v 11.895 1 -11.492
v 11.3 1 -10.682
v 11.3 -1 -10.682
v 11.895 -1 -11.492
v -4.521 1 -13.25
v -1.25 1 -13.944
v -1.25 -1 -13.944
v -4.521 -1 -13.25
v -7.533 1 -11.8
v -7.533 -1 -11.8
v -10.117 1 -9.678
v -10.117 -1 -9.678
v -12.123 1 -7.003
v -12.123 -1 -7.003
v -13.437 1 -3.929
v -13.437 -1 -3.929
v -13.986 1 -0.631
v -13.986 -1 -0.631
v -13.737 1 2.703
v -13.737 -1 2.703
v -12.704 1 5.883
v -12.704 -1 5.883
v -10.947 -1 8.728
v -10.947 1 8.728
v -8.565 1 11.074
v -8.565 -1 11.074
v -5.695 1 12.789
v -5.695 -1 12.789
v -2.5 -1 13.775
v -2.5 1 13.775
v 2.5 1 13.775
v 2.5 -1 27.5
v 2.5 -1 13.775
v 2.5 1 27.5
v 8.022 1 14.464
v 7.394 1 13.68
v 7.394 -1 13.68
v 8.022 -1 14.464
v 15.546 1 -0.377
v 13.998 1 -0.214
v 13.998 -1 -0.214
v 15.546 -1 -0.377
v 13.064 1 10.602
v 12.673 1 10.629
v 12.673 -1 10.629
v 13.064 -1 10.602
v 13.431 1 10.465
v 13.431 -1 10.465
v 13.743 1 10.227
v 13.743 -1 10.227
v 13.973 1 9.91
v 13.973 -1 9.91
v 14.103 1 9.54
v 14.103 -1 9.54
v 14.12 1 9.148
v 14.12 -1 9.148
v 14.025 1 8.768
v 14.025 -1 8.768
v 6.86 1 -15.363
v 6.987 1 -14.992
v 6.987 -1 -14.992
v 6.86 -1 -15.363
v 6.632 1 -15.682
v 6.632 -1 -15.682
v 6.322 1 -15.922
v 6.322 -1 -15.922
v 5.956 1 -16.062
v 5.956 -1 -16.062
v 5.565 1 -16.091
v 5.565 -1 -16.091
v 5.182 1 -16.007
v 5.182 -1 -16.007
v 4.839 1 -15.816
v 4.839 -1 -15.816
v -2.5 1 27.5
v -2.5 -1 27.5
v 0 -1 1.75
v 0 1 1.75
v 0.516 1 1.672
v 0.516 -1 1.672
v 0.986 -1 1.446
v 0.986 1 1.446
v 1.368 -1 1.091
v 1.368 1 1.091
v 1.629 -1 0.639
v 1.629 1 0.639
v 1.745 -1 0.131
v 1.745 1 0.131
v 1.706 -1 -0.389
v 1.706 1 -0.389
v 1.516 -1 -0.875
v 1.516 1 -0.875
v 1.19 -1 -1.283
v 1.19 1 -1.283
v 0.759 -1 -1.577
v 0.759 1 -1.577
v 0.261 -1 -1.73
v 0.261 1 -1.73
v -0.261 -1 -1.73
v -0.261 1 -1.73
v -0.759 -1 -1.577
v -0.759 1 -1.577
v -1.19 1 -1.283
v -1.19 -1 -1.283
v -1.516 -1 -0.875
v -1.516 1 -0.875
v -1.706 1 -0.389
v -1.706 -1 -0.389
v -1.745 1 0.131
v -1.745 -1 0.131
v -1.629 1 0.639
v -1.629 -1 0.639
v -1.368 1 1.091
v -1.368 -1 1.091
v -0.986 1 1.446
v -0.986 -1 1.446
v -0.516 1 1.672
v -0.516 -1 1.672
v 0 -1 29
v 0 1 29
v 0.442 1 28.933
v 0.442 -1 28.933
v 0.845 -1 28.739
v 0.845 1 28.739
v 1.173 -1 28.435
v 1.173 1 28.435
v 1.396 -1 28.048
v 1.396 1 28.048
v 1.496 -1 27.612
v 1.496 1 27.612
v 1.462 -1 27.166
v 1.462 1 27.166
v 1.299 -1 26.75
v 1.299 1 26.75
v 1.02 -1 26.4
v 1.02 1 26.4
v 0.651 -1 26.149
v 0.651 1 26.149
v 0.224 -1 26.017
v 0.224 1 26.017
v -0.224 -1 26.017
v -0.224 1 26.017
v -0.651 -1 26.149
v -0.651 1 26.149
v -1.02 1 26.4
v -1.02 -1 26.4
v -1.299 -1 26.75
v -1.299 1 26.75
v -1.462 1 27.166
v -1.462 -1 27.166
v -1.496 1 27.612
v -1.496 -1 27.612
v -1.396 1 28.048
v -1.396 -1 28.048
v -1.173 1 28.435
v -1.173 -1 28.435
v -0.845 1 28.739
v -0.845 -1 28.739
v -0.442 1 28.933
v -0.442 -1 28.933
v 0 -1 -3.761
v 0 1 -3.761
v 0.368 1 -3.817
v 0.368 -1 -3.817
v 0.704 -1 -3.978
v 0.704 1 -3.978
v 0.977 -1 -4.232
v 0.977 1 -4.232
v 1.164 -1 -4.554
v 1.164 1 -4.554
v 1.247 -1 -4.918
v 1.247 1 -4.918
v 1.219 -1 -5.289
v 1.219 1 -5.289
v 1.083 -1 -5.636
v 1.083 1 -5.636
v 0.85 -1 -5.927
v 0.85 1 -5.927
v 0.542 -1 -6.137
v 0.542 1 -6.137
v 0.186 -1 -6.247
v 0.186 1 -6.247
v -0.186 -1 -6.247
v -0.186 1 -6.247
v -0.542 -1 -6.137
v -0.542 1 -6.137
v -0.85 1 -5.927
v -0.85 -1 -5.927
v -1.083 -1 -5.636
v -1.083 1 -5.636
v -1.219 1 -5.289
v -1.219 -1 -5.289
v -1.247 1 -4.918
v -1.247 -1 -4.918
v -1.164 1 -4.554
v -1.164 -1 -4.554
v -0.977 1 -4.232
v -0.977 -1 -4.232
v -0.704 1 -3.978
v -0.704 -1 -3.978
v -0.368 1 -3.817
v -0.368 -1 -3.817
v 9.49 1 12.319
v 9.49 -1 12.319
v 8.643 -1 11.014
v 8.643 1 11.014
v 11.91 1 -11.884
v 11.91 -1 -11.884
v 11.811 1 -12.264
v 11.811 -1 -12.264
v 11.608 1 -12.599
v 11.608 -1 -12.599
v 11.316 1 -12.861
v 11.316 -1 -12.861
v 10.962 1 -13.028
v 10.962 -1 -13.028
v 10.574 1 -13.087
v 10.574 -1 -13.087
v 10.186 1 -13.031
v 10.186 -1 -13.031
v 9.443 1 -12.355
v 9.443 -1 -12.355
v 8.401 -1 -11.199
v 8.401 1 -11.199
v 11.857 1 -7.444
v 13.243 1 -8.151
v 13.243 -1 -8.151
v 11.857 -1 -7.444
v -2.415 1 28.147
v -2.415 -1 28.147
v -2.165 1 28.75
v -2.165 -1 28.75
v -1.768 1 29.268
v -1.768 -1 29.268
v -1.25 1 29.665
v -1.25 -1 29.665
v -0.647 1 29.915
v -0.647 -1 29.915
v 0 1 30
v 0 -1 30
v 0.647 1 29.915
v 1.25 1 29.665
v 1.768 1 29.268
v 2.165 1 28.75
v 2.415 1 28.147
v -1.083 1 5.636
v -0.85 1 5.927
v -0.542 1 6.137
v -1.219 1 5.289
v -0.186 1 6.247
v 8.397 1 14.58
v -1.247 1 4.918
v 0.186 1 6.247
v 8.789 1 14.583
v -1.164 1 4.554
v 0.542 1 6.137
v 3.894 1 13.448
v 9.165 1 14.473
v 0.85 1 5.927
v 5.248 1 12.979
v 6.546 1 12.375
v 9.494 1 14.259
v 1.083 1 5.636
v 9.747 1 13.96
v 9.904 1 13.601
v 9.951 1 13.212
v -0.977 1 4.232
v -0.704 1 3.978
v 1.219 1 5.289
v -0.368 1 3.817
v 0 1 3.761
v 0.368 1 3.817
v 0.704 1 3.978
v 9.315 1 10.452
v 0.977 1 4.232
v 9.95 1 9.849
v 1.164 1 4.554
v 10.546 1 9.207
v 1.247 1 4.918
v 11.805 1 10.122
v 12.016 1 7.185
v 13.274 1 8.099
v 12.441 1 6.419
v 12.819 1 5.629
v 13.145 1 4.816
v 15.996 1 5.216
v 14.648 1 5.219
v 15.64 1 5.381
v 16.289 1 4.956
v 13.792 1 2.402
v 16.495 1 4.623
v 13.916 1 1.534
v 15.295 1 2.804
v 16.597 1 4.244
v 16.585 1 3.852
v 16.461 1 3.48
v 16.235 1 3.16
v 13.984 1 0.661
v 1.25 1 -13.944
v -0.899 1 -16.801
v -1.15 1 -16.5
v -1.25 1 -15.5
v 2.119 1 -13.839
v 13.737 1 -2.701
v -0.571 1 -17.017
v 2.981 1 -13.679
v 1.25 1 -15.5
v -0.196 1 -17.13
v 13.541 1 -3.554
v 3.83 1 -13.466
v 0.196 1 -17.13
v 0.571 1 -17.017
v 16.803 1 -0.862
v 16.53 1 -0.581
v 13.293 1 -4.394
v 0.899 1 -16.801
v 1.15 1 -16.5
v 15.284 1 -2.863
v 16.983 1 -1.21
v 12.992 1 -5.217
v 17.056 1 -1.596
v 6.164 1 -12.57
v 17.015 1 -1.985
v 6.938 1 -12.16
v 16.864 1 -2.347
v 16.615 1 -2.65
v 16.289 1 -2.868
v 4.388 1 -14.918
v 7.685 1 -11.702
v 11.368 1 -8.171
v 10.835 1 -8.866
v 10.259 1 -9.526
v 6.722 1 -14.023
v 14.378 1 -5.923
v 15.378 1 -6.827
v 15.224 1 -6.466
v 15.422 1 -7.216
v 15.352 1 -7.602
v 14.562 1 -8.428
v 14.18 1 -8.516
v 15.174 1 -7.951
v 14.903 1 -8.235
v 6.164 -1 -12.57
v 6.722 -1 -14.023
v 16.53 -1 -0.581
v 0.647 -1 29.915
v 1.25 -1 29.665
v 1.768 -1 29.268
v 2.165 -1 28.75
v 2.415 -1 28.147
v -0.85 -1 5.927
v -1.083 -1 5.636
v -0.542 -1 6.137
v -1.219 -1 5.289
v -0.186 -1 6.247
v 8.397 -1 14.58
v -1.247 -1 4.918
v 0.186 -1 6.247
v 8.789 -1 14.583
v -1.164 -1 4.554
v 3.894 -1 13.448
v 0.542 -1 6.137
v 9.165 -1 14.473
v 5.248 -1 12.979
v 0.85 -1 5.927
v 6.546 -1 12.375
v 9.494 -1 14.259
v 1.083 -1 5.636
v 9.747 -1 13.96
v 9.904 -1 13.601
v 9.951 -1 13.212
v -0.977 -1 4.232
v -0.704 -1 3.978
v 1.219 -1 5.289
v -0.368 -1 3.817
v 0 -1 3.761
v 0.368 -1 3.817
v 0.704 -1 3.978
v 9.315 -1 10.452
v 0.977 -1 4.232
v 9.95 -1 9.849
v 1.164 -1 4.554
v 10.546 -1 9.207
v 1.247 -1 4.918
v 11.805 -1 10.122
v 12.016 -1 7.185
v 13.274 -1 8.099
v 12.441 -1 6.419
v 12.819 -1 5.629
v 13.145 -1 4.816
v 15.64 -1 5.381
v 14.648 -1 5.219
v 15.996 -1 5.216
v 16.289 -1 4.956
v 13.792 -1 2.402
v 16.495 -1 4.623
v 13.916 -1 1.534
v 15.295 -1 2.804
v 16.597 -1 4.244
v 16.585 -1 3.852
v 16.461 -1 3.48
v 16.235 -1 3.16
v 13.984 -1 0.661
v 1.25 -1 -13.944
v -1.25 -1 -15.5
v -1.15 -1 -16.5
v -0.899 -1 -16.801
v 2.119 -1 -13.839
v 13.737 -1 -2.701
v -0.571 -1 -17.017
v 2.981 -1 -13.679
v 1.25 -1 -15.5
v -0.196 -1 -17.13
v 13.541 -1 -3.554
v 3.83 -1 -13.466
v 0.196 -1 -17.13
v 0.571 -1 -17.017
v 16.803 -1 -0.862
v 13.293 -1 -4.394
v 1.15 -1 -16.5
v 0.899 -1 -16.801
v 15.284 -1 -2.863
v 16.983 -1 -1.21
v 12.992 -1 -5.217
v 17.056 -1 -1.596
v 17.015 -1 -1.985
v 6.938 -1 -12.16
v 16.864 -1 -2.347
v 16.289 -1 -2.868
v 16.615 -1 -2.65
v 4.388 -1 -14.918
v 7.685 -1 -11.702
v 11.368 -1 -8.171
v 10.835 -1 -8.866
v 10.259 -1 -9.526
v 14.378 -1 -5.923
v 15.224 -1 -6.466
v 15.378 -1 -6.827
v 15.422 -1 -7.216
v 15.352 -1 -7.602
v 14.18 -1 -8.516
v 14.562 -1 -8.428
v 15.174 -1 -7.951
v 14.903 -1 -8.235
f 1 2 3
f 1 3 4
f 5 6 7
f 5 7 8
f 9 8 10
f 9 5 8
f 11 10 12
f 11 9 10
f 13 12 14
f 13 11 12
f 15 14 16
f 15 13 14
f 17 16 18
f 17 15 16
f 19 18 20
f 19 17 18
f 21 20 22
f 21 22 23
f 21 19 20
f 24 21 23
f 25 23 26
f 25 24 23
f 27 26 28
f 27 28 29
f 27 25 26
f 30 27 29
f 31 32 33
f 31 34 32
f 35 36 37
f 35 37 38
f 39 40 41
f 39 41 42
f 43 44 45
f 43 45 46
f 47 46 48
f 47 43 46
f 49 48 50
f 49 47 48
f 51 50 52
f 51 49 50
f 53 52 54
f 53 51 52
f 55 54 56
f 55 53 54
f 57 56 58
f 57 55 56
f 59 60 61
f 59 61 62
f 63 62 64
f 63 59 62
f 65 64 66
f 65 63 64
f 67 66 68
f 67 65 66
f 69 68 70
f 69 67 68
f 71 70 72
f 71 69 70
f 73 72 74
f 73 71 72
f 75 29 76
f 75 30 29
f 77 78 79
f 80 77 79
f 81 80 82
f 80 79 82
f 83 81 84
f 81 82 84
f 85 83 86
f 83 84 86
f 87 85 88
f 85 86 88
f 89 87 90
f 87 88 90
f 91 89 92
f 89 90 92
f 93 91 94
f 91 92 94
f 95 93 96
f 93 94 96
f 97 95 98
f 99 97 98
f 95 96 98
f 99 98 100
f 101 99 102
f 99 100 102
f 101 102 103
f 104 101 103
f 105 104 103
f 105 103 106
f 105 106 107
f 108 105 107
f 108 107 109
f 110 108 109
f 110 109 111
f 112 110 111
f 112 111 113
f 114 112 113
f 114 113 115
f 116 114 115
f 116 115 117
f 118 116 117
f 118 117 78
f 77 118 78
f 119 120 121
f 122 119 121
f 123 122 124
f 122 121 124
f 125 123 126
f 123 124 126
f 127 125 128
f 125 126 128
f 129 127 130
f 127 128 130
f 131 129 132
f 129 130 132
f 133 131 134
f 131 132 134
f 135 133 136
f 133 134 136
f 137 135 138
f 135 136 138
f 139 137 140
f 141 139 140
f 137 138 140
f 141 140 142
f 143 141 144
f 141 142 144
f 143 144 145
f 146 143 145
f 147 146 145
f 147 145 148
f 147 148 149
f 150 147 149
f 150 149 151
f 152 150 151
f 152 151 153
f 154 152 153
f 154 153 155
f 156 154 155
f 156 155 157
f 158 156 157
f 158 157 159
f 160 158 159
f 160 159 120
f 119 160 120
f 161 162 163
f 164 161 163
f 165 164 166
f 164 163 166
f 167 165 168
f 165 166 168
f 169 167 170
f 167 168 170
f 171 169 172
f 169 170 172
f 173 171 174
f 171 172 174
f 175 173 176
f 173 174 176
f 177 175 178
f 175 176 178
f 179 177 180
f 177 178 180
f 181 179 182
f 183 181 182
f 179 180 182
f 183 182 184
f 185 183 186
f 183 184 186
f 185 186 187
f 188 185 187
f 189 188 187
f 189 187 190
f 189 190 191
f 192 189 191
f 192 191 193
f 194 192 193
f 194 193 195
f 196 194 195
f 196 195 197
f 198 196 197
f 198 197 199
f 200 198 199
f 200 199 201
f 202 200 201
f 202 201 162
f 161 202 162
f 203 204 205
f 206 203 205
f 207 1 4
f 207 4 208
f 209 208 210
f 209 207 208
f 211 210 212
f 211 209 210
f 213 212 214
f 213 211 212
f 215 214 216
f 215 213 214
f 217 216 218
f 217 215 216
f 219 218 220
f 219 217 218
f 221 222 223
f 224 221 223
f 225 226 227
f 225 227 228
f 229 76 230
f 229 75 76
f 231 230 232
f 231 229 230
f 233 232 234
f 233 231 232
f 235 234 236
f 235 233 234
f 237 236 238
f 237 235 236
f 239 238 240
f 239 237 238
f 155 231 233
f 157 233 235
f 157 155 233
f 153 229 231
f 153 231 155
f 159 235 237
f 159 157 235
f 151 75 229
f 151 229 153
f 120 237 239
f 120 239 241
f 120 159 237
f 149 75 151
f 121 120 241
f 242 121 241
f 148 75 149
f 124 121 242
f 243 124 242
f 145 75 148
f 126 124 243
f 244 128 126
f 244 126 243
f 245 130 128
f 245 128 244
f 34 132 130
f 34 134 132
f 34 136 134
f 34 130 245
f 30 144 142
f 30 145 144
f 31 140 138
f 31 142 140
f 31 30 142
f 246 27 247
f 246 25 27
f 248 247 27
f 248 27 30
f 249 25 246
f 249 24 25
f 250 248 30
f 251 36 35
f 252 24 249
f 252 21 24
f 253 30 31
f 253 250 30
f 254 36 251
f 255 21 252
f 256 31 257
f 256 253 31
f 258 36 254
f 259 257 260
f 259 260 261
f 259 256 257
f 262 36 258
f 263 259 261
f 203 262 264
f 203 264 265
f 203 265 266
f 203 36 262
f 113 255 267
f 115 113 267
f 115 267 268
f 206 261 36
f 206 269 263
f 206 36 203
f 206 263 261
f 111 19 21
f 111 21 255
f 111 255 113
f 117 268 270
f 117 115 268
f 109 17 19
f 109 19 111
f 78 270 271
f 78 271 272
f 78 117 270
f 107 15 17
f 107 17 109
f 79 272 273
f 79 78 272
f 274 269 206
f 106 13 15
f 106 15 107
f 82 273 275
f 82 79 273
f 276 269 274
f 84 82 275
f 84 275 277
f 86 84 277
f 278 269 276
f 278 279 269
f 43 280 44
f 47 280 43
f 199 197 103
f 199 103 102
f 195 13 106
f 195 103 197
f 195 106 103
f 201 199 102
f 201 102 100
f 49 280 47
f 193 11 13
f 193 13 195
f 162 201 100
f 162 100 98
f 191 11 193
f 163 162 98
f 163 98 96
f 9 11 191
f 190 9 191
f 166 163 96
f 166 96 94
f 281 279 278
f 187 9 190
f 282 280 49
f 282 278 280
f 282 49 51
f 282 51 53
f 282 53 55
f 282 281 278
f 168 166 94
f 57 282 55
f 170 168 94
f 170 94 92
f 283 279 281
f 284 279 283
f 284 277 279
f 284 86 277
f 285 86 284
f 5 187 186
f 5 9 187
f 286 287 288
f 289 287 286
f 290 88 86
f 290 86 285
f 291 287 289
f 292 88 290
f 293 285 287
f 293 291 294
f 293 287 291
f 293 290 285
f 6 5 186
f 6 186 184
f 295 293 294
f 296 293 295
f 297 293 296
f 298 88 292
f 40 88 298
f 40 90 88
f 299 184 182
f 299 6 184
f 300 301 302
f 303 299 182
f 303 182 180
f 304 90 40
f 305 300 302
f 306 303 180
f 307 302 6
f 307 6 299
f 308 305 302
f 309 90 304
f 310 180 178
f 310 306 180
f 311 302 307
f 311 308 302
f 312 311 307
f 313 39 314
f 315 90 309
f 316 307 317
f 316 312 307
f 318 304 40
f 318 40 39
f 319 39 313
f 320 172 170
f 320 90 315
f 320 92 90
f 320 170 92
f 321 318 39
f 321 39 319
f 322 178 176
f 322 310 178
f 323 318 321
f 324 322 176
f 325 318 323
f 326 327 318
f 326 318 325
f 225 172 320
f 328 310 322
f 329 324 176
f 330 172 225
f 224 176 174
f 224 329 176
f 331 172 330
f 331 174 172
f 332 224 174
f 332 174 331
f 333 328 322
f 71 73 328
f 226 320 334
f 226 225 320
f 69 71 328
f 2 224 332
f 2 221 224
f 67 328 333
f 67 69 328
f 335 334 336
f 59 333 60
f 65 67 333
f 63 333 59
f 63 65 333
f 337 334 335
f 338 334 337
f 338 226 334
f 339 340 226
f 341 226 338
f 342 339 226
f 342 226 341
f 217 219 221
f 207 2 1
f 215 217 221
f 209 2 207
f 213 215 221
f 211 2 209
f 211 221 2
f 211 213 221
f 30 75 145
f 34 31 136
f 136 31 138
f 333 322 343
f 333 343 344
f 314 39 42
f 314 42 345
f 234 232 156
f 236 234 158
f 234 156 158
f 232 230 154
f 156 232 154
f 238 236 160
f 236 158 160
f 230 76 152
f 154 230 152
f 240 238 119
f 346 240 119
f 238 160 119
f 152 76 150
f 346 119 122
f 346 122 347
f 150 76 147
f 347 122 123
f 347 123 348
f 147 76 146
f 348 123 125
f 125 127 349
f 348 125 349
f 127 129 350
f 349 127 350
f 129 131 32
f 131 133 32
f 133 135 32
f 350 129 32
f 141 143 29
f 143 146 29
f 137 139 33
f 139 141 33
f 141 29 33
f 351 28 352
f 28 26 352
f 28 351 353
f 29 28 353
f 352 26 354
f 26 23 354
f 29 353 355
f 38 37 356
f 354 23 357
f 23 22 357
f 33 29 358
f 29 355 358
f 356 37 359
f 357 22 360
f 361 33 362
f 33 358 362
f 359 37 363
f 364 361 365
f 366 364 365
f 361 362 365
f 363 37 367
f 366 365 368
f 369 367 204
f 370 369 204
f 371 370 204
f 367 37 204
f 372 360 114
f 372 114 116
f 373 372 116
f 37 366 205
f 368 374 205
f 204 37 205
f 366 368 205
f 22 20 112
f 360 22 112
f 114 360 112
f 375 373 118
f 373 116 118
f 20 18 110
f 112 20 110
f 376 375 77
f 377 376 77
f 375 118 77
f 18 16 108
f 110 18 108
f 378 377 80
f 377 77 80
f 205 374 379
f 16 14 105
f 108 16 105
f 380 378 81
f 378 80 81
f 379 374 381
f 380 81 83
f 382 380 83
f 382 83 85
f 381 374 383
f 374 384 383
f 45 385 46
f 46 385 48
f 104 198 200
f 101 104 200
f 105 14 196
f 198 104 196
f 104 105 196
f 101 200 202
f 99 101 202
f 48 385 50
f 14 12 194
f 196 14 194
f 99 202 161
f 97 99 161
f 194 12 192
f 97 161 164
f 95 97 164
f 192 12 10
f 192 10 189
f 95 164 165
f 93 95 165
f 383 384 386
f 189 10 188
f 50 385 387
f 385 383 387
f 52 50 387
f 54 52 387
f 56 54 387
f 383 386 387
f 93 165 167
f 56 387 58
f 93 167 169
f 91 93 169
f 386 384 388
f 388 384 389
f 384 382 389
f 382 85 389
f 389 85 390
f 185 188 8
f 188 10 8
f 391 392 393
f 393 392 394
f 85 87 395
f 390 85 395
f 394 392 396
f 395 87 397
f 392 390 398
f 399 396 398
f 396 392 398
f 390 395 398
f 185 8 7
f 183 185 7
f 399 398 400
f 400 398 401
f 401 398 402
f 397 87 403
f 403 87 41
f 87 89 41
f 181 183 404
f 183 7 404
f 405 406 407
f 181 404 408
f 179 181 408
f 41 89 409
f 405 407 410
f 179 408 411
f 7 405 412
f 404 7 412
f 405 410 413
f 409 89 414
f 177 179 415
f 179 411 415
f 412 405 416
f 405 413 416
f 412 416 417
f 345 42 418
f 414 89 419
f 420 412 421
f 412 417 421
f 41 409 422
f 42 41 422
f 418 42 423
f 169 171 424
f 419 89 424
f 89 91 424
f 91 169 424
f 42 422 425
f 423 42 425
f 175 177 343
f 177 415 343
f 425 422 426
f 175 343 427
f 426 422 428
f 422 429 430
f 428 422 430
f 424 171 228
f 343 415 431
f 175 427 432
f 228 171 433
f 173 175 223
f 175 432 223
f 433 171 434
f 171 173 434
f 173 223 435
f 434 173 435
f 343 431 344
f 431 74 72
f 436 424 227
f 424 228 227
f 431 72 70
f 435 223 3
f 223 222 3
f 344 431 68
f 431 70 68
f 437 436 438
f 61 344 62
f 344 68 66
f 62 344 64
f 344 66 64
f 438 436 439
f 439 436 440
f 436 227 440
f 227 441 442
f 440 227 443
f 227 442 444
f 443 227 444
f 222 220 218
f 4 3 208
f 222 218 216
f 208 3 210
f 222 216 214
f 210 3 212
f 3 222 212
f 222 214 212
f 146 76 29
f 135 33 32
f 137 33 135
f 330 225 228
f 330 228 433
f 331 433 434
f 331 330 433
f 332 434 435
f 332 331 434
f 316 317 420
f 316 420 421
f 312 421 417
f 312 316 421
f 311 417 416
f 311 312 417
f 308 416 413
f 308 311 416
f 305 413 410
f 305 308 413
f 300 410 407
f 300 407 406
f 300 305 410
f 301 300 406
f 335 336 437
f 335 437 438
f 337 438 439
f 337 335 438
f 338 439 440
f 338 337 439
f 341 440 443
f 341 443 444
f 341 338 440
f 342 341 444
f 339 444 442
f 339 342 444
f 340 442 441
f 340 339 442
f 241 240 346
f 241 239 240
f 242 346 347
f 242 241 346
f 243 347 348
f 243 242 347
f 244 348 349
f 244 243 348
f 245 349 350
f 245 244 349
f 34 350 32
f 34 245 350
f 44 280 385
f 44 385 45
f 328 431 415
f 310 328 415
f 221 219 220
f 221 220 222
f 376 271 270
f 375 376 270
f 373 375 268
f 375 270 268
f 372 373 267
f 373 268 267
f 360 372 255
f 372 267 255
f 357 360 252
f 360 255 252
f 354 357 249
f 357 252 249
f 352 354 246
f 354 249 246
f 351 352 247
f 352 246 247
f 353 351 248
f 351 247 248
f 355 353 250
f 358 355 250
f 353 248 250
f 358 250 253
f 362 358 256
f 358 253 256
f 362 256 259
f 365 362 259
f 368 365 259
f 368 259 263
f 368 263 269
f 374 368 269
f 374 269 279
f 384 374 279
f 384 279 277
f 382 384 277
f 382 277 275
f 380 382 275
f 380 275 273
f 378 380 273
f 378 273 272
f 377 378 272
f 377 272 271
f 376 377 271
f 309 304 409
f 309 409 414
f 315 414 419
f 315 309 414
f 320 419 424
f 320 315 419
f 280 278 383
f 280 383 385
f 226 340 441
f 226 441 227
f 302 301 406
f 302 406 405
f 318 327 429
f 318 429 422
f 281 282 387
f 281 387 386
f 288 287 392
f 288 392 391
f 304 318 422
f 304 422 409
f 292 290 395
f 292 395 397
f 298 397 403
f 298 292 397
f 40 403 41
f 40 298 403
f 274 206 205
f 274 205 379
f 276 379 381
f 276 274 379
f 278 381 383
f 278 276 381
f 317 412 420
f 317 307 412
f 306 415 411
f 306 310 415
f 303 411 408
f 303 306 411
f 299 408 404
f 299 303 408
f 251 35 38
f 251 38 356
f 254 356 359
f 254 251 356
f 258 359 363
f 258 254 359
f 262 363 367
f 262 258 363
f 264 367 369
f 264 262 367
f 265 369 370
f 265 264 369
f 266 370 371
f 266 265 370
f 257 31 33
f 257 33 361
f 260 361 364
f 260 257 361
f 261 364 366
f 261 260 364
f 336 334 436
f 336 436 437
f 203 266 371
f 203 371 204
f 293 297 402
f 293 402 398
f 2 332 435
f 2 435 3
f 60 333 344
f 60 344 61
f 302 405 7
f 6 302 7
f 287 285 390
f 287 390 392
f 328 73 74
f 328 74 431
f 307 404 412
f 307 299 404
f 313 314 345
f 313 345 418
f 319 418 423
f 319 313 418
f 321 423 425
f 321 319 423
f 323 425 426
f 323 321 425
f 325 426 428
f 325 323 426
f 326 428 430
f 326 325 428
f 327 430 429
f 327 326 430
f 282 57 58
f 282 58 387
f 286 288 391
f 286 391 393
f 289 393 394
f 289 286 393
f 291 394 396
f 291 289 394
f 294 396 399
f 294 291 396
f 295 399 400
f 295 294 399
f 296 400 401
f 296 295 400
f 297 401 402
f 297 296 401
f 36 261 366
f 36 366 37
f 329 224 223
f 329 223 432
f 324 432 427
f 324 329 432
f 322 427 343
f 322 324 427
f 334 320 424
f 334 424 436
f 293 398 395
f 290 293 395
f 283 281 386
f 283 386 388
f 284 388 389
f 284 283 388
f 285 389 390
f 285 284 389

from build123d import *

# Parameters (mm, degrees)
BOSS_EXTRUDE1_DEPTH = 1
SKETCH5_R           = 1.75
SKETCH5_R_2         = 1.25
CUT_EXTRUDE3_DEPTH  = 35.568104475
FILLET1_R           = 2.5
SKETCH6_R           = 1.5
CUT_EXTRUDE4_DEPTH  = 35.568104475


with BuildPart() as part:
    # Sketch1 → Boss-Extrude1 (new, symmetric)
    with BuildSketch(Plane(origin=(0, 0, 0), x_dir=(1, 0, 0), z_dir=(0, 1, 0))):
        with BuildLine():
            Line((1.25, 15.5), (1.15, 16.5))
            ThreePointArc((1.15, 16.5), (0, 17.143895929), (-1.15, 16.5))
            Line((-1.15, 16.5), (-1.25, 15.5))
            Line((-1.25, 15.5), (-1.25, 13.944084767))
            ThreePointArc((-1.25, 13.944084767), (-13.985786559, 0.630693533), (-2.5, -13.774977314))
            Line((-2.5, -13.774977314), (-2.5, -30))
            Line((-2.5, -30), (2.5, -30))
            Line((2.5, -30), (2.5, -13.774977314))
            ThreePointArc((2.5, -13.774977314), (4.576899397, -13.230721519), (6.546154662, -12.375292285))
            Line((6.546154662, -12.375292285), (7.393566833, -13.680192597))
            Line((7.393566833, -13.680192597), (8.022072925, -14.464399261))
            ThreePointArc((8.022072925, -14.464399261), (9.337234935, -14.378080935), (9.951015231, -13.211729481))
            Line((9.951015231, -13.211729481), (9.490243253, -12.318595009))
            Line((9.490243253, -12.318595009), (8.642831082, -11.013694698))
            ThreePointArc((8.642831082, -11.013694698), (9.63696406, -10.155241194), (10.546269982, -9.207398626))
            Line((10.546269982, -9.207398626), (11.805031847, -10.121942654))
            Line((11.805031847, -10.121942654), (12.672827367, -10.628826206))
            ThreePointArc((12.672827367, -10.628826206), (13.869703156, -10.076929194), (14.024733447, -8.768087119))
            Line((14.024733447, -8.768087119), (13.274494978, -8.099400168))
            Line((13.274494978, -8.099400168), (12.015733113, -7.18485614))
            ThreePointArc((12.015733113, -7.18485614), (12.636193981, -6.027155355), (13.145427794, -4.816401987))
            Line((13.145427794, -4.816401987), (14.648326501, -5.219102482))
            Line((14.648326501, -5.219102482), (15.640134232, -5.381328944))
            ThreePointArc((15.640134232, -5.381328944), (16.559731841, -4.437166774), (16.235418036, -3.159699544))
            Line((16.235418036, -3.159699544), (15.295374114, -2.804287916))
            Line((15.295374114, -2.804287916), (13.792475407, -2.401587421))
            ThreePointArc((13.792475407, -2.401587421), (13.956842672, -1.09842734), (13.998358191, 0.214401383))
            Line((13.998358191, 0.214401383), (15.545749957, 0.377038811))
            Line((15.545749957, 0.377038811), (16.529819006, 0.581019464))
            ThreePointArc((16.529819006, 0.581019464), (17.049979873, 1.792025096), (16.289403541, 2.868419824))
            Line((16.289403541, 2.868419824), (15.284428799, 2.86334355))
            Line((15.284428799, 2.86334355), (13.737037033, 2.700706122))
            ThreePointArc((13.737037033, 2.700706122), (13.423476288, 3.976214826), (12.991758626, 5.216723857))
            Line((12.991758626, 5.216723857), (14.37808925, 5.923094591))
            Line((14.37808925, 5.923094591), (15.223696724, 6.466185743))
            ThreePointArc((15.223696724, 6.466185743), (15.275323122, 7.78316588), (14.179518574, 8.515500749))
            Line((14.179518574, 8.515500749), (13.243113, 8.150610901))
            Line((13.243113, 8.150610901), (11.856782377, 7.444240167))
            ThreePointArc((11.856782377, 7.444240167), (11.106946764, 8.522660006), (10.259344927, 9.526061183))
            Line((10.259344927, 9.526061183), (11.30045543, 10.682331537))
            Line((11.30045543, 10.682331537), (11.895271554, 11.492389423))
            ThreePointArc((11.895271554, 11.492389423), (11.471505478, 12.740397548), (10.186038456, 13.031389818))
            Line((10.186038456, 13.031389818), (9.442593367, 12.355158053))
            Line((9.442593367, 12.355158053), (8.401482864, 11.198887699))
            ThreePointArc((8.401482864, 11.198887699), (7.314979906, 11.936962301), (6.164088599, 12.569964667))
            Line((6.164088599, 12.569964667), (6.721678751, 14.022536674))
            Line((6.721678751, 14.022536674), (6.986688658, 14.991953895))
            ThreePointArc((6.986688658, 14.991953895), (6.143822831, 16.005205673), (4.839453677, 15.816200179))
            Line((4.839453677, 15.816200179), (4.387727685, 14.918456548))
            Line((4.387727685, 14.918456548), (3.830137533, 13.465884541))
            ThreePointArc((3.830137533, 13.465884541), (2.551297357, 13.765568706), (1.25, 13.944084767))
            Line((1.25, 13.944084767), (1.25, 15.5))
        make_face()
    extrude(amount=BOSS_EXTRUDE1_DEPTH, both=True)

    # Sketch5 → Cut-Extrude3 (cut, through all)
    with BuildSketch(Plane(origin=(0, 1, 0), x_dir=(1, 0, 0), z_dir=(0, 1, 0))):
        with Locations(Location((0, 0, 0), (0, 0, 270))):
            Circle(SKETCH5_R)
        with Locations(Location((0, 5.011164895, 0), (0, 0, 270))):
            Circle(SKETCH5_R_2)
        with Locations(Location((0, -5.011164895, 0), (0, 0, 90))):
            Circle(SKETCH5_R_2)
    extrude(amount=-CUT_EXTRUDE3_DEPTH, mode=Mode.SUBTRACT)

    # Fillet1
    fillet1_edges = [part.edges().sort_by_distance(p)[0] for p in [
        (-2.5, 0, 30),
        (2.5, 0, 30),
    ]]
    fillet(fillet1_edges, radius=FILLET1_R - 0.0001)  # a hair under: the kernel refuses the full size

    # Sketch6 → Cut-Extrude4 (cut, through all)
    with BuildSketch(Plane(origin=(0, 1, 0), x_dir=(1, 0, 0), z_dir=(0, 1, 0))):
        with Locations(Location((0, -27.5, 0), (0, 0, 270))):
            Circle(SKETCH6_R)
    extrude(amount=-CUT_EXTRUDE4_DEPTH, mode=Mode.SUBTRACT)


solid = part.part
